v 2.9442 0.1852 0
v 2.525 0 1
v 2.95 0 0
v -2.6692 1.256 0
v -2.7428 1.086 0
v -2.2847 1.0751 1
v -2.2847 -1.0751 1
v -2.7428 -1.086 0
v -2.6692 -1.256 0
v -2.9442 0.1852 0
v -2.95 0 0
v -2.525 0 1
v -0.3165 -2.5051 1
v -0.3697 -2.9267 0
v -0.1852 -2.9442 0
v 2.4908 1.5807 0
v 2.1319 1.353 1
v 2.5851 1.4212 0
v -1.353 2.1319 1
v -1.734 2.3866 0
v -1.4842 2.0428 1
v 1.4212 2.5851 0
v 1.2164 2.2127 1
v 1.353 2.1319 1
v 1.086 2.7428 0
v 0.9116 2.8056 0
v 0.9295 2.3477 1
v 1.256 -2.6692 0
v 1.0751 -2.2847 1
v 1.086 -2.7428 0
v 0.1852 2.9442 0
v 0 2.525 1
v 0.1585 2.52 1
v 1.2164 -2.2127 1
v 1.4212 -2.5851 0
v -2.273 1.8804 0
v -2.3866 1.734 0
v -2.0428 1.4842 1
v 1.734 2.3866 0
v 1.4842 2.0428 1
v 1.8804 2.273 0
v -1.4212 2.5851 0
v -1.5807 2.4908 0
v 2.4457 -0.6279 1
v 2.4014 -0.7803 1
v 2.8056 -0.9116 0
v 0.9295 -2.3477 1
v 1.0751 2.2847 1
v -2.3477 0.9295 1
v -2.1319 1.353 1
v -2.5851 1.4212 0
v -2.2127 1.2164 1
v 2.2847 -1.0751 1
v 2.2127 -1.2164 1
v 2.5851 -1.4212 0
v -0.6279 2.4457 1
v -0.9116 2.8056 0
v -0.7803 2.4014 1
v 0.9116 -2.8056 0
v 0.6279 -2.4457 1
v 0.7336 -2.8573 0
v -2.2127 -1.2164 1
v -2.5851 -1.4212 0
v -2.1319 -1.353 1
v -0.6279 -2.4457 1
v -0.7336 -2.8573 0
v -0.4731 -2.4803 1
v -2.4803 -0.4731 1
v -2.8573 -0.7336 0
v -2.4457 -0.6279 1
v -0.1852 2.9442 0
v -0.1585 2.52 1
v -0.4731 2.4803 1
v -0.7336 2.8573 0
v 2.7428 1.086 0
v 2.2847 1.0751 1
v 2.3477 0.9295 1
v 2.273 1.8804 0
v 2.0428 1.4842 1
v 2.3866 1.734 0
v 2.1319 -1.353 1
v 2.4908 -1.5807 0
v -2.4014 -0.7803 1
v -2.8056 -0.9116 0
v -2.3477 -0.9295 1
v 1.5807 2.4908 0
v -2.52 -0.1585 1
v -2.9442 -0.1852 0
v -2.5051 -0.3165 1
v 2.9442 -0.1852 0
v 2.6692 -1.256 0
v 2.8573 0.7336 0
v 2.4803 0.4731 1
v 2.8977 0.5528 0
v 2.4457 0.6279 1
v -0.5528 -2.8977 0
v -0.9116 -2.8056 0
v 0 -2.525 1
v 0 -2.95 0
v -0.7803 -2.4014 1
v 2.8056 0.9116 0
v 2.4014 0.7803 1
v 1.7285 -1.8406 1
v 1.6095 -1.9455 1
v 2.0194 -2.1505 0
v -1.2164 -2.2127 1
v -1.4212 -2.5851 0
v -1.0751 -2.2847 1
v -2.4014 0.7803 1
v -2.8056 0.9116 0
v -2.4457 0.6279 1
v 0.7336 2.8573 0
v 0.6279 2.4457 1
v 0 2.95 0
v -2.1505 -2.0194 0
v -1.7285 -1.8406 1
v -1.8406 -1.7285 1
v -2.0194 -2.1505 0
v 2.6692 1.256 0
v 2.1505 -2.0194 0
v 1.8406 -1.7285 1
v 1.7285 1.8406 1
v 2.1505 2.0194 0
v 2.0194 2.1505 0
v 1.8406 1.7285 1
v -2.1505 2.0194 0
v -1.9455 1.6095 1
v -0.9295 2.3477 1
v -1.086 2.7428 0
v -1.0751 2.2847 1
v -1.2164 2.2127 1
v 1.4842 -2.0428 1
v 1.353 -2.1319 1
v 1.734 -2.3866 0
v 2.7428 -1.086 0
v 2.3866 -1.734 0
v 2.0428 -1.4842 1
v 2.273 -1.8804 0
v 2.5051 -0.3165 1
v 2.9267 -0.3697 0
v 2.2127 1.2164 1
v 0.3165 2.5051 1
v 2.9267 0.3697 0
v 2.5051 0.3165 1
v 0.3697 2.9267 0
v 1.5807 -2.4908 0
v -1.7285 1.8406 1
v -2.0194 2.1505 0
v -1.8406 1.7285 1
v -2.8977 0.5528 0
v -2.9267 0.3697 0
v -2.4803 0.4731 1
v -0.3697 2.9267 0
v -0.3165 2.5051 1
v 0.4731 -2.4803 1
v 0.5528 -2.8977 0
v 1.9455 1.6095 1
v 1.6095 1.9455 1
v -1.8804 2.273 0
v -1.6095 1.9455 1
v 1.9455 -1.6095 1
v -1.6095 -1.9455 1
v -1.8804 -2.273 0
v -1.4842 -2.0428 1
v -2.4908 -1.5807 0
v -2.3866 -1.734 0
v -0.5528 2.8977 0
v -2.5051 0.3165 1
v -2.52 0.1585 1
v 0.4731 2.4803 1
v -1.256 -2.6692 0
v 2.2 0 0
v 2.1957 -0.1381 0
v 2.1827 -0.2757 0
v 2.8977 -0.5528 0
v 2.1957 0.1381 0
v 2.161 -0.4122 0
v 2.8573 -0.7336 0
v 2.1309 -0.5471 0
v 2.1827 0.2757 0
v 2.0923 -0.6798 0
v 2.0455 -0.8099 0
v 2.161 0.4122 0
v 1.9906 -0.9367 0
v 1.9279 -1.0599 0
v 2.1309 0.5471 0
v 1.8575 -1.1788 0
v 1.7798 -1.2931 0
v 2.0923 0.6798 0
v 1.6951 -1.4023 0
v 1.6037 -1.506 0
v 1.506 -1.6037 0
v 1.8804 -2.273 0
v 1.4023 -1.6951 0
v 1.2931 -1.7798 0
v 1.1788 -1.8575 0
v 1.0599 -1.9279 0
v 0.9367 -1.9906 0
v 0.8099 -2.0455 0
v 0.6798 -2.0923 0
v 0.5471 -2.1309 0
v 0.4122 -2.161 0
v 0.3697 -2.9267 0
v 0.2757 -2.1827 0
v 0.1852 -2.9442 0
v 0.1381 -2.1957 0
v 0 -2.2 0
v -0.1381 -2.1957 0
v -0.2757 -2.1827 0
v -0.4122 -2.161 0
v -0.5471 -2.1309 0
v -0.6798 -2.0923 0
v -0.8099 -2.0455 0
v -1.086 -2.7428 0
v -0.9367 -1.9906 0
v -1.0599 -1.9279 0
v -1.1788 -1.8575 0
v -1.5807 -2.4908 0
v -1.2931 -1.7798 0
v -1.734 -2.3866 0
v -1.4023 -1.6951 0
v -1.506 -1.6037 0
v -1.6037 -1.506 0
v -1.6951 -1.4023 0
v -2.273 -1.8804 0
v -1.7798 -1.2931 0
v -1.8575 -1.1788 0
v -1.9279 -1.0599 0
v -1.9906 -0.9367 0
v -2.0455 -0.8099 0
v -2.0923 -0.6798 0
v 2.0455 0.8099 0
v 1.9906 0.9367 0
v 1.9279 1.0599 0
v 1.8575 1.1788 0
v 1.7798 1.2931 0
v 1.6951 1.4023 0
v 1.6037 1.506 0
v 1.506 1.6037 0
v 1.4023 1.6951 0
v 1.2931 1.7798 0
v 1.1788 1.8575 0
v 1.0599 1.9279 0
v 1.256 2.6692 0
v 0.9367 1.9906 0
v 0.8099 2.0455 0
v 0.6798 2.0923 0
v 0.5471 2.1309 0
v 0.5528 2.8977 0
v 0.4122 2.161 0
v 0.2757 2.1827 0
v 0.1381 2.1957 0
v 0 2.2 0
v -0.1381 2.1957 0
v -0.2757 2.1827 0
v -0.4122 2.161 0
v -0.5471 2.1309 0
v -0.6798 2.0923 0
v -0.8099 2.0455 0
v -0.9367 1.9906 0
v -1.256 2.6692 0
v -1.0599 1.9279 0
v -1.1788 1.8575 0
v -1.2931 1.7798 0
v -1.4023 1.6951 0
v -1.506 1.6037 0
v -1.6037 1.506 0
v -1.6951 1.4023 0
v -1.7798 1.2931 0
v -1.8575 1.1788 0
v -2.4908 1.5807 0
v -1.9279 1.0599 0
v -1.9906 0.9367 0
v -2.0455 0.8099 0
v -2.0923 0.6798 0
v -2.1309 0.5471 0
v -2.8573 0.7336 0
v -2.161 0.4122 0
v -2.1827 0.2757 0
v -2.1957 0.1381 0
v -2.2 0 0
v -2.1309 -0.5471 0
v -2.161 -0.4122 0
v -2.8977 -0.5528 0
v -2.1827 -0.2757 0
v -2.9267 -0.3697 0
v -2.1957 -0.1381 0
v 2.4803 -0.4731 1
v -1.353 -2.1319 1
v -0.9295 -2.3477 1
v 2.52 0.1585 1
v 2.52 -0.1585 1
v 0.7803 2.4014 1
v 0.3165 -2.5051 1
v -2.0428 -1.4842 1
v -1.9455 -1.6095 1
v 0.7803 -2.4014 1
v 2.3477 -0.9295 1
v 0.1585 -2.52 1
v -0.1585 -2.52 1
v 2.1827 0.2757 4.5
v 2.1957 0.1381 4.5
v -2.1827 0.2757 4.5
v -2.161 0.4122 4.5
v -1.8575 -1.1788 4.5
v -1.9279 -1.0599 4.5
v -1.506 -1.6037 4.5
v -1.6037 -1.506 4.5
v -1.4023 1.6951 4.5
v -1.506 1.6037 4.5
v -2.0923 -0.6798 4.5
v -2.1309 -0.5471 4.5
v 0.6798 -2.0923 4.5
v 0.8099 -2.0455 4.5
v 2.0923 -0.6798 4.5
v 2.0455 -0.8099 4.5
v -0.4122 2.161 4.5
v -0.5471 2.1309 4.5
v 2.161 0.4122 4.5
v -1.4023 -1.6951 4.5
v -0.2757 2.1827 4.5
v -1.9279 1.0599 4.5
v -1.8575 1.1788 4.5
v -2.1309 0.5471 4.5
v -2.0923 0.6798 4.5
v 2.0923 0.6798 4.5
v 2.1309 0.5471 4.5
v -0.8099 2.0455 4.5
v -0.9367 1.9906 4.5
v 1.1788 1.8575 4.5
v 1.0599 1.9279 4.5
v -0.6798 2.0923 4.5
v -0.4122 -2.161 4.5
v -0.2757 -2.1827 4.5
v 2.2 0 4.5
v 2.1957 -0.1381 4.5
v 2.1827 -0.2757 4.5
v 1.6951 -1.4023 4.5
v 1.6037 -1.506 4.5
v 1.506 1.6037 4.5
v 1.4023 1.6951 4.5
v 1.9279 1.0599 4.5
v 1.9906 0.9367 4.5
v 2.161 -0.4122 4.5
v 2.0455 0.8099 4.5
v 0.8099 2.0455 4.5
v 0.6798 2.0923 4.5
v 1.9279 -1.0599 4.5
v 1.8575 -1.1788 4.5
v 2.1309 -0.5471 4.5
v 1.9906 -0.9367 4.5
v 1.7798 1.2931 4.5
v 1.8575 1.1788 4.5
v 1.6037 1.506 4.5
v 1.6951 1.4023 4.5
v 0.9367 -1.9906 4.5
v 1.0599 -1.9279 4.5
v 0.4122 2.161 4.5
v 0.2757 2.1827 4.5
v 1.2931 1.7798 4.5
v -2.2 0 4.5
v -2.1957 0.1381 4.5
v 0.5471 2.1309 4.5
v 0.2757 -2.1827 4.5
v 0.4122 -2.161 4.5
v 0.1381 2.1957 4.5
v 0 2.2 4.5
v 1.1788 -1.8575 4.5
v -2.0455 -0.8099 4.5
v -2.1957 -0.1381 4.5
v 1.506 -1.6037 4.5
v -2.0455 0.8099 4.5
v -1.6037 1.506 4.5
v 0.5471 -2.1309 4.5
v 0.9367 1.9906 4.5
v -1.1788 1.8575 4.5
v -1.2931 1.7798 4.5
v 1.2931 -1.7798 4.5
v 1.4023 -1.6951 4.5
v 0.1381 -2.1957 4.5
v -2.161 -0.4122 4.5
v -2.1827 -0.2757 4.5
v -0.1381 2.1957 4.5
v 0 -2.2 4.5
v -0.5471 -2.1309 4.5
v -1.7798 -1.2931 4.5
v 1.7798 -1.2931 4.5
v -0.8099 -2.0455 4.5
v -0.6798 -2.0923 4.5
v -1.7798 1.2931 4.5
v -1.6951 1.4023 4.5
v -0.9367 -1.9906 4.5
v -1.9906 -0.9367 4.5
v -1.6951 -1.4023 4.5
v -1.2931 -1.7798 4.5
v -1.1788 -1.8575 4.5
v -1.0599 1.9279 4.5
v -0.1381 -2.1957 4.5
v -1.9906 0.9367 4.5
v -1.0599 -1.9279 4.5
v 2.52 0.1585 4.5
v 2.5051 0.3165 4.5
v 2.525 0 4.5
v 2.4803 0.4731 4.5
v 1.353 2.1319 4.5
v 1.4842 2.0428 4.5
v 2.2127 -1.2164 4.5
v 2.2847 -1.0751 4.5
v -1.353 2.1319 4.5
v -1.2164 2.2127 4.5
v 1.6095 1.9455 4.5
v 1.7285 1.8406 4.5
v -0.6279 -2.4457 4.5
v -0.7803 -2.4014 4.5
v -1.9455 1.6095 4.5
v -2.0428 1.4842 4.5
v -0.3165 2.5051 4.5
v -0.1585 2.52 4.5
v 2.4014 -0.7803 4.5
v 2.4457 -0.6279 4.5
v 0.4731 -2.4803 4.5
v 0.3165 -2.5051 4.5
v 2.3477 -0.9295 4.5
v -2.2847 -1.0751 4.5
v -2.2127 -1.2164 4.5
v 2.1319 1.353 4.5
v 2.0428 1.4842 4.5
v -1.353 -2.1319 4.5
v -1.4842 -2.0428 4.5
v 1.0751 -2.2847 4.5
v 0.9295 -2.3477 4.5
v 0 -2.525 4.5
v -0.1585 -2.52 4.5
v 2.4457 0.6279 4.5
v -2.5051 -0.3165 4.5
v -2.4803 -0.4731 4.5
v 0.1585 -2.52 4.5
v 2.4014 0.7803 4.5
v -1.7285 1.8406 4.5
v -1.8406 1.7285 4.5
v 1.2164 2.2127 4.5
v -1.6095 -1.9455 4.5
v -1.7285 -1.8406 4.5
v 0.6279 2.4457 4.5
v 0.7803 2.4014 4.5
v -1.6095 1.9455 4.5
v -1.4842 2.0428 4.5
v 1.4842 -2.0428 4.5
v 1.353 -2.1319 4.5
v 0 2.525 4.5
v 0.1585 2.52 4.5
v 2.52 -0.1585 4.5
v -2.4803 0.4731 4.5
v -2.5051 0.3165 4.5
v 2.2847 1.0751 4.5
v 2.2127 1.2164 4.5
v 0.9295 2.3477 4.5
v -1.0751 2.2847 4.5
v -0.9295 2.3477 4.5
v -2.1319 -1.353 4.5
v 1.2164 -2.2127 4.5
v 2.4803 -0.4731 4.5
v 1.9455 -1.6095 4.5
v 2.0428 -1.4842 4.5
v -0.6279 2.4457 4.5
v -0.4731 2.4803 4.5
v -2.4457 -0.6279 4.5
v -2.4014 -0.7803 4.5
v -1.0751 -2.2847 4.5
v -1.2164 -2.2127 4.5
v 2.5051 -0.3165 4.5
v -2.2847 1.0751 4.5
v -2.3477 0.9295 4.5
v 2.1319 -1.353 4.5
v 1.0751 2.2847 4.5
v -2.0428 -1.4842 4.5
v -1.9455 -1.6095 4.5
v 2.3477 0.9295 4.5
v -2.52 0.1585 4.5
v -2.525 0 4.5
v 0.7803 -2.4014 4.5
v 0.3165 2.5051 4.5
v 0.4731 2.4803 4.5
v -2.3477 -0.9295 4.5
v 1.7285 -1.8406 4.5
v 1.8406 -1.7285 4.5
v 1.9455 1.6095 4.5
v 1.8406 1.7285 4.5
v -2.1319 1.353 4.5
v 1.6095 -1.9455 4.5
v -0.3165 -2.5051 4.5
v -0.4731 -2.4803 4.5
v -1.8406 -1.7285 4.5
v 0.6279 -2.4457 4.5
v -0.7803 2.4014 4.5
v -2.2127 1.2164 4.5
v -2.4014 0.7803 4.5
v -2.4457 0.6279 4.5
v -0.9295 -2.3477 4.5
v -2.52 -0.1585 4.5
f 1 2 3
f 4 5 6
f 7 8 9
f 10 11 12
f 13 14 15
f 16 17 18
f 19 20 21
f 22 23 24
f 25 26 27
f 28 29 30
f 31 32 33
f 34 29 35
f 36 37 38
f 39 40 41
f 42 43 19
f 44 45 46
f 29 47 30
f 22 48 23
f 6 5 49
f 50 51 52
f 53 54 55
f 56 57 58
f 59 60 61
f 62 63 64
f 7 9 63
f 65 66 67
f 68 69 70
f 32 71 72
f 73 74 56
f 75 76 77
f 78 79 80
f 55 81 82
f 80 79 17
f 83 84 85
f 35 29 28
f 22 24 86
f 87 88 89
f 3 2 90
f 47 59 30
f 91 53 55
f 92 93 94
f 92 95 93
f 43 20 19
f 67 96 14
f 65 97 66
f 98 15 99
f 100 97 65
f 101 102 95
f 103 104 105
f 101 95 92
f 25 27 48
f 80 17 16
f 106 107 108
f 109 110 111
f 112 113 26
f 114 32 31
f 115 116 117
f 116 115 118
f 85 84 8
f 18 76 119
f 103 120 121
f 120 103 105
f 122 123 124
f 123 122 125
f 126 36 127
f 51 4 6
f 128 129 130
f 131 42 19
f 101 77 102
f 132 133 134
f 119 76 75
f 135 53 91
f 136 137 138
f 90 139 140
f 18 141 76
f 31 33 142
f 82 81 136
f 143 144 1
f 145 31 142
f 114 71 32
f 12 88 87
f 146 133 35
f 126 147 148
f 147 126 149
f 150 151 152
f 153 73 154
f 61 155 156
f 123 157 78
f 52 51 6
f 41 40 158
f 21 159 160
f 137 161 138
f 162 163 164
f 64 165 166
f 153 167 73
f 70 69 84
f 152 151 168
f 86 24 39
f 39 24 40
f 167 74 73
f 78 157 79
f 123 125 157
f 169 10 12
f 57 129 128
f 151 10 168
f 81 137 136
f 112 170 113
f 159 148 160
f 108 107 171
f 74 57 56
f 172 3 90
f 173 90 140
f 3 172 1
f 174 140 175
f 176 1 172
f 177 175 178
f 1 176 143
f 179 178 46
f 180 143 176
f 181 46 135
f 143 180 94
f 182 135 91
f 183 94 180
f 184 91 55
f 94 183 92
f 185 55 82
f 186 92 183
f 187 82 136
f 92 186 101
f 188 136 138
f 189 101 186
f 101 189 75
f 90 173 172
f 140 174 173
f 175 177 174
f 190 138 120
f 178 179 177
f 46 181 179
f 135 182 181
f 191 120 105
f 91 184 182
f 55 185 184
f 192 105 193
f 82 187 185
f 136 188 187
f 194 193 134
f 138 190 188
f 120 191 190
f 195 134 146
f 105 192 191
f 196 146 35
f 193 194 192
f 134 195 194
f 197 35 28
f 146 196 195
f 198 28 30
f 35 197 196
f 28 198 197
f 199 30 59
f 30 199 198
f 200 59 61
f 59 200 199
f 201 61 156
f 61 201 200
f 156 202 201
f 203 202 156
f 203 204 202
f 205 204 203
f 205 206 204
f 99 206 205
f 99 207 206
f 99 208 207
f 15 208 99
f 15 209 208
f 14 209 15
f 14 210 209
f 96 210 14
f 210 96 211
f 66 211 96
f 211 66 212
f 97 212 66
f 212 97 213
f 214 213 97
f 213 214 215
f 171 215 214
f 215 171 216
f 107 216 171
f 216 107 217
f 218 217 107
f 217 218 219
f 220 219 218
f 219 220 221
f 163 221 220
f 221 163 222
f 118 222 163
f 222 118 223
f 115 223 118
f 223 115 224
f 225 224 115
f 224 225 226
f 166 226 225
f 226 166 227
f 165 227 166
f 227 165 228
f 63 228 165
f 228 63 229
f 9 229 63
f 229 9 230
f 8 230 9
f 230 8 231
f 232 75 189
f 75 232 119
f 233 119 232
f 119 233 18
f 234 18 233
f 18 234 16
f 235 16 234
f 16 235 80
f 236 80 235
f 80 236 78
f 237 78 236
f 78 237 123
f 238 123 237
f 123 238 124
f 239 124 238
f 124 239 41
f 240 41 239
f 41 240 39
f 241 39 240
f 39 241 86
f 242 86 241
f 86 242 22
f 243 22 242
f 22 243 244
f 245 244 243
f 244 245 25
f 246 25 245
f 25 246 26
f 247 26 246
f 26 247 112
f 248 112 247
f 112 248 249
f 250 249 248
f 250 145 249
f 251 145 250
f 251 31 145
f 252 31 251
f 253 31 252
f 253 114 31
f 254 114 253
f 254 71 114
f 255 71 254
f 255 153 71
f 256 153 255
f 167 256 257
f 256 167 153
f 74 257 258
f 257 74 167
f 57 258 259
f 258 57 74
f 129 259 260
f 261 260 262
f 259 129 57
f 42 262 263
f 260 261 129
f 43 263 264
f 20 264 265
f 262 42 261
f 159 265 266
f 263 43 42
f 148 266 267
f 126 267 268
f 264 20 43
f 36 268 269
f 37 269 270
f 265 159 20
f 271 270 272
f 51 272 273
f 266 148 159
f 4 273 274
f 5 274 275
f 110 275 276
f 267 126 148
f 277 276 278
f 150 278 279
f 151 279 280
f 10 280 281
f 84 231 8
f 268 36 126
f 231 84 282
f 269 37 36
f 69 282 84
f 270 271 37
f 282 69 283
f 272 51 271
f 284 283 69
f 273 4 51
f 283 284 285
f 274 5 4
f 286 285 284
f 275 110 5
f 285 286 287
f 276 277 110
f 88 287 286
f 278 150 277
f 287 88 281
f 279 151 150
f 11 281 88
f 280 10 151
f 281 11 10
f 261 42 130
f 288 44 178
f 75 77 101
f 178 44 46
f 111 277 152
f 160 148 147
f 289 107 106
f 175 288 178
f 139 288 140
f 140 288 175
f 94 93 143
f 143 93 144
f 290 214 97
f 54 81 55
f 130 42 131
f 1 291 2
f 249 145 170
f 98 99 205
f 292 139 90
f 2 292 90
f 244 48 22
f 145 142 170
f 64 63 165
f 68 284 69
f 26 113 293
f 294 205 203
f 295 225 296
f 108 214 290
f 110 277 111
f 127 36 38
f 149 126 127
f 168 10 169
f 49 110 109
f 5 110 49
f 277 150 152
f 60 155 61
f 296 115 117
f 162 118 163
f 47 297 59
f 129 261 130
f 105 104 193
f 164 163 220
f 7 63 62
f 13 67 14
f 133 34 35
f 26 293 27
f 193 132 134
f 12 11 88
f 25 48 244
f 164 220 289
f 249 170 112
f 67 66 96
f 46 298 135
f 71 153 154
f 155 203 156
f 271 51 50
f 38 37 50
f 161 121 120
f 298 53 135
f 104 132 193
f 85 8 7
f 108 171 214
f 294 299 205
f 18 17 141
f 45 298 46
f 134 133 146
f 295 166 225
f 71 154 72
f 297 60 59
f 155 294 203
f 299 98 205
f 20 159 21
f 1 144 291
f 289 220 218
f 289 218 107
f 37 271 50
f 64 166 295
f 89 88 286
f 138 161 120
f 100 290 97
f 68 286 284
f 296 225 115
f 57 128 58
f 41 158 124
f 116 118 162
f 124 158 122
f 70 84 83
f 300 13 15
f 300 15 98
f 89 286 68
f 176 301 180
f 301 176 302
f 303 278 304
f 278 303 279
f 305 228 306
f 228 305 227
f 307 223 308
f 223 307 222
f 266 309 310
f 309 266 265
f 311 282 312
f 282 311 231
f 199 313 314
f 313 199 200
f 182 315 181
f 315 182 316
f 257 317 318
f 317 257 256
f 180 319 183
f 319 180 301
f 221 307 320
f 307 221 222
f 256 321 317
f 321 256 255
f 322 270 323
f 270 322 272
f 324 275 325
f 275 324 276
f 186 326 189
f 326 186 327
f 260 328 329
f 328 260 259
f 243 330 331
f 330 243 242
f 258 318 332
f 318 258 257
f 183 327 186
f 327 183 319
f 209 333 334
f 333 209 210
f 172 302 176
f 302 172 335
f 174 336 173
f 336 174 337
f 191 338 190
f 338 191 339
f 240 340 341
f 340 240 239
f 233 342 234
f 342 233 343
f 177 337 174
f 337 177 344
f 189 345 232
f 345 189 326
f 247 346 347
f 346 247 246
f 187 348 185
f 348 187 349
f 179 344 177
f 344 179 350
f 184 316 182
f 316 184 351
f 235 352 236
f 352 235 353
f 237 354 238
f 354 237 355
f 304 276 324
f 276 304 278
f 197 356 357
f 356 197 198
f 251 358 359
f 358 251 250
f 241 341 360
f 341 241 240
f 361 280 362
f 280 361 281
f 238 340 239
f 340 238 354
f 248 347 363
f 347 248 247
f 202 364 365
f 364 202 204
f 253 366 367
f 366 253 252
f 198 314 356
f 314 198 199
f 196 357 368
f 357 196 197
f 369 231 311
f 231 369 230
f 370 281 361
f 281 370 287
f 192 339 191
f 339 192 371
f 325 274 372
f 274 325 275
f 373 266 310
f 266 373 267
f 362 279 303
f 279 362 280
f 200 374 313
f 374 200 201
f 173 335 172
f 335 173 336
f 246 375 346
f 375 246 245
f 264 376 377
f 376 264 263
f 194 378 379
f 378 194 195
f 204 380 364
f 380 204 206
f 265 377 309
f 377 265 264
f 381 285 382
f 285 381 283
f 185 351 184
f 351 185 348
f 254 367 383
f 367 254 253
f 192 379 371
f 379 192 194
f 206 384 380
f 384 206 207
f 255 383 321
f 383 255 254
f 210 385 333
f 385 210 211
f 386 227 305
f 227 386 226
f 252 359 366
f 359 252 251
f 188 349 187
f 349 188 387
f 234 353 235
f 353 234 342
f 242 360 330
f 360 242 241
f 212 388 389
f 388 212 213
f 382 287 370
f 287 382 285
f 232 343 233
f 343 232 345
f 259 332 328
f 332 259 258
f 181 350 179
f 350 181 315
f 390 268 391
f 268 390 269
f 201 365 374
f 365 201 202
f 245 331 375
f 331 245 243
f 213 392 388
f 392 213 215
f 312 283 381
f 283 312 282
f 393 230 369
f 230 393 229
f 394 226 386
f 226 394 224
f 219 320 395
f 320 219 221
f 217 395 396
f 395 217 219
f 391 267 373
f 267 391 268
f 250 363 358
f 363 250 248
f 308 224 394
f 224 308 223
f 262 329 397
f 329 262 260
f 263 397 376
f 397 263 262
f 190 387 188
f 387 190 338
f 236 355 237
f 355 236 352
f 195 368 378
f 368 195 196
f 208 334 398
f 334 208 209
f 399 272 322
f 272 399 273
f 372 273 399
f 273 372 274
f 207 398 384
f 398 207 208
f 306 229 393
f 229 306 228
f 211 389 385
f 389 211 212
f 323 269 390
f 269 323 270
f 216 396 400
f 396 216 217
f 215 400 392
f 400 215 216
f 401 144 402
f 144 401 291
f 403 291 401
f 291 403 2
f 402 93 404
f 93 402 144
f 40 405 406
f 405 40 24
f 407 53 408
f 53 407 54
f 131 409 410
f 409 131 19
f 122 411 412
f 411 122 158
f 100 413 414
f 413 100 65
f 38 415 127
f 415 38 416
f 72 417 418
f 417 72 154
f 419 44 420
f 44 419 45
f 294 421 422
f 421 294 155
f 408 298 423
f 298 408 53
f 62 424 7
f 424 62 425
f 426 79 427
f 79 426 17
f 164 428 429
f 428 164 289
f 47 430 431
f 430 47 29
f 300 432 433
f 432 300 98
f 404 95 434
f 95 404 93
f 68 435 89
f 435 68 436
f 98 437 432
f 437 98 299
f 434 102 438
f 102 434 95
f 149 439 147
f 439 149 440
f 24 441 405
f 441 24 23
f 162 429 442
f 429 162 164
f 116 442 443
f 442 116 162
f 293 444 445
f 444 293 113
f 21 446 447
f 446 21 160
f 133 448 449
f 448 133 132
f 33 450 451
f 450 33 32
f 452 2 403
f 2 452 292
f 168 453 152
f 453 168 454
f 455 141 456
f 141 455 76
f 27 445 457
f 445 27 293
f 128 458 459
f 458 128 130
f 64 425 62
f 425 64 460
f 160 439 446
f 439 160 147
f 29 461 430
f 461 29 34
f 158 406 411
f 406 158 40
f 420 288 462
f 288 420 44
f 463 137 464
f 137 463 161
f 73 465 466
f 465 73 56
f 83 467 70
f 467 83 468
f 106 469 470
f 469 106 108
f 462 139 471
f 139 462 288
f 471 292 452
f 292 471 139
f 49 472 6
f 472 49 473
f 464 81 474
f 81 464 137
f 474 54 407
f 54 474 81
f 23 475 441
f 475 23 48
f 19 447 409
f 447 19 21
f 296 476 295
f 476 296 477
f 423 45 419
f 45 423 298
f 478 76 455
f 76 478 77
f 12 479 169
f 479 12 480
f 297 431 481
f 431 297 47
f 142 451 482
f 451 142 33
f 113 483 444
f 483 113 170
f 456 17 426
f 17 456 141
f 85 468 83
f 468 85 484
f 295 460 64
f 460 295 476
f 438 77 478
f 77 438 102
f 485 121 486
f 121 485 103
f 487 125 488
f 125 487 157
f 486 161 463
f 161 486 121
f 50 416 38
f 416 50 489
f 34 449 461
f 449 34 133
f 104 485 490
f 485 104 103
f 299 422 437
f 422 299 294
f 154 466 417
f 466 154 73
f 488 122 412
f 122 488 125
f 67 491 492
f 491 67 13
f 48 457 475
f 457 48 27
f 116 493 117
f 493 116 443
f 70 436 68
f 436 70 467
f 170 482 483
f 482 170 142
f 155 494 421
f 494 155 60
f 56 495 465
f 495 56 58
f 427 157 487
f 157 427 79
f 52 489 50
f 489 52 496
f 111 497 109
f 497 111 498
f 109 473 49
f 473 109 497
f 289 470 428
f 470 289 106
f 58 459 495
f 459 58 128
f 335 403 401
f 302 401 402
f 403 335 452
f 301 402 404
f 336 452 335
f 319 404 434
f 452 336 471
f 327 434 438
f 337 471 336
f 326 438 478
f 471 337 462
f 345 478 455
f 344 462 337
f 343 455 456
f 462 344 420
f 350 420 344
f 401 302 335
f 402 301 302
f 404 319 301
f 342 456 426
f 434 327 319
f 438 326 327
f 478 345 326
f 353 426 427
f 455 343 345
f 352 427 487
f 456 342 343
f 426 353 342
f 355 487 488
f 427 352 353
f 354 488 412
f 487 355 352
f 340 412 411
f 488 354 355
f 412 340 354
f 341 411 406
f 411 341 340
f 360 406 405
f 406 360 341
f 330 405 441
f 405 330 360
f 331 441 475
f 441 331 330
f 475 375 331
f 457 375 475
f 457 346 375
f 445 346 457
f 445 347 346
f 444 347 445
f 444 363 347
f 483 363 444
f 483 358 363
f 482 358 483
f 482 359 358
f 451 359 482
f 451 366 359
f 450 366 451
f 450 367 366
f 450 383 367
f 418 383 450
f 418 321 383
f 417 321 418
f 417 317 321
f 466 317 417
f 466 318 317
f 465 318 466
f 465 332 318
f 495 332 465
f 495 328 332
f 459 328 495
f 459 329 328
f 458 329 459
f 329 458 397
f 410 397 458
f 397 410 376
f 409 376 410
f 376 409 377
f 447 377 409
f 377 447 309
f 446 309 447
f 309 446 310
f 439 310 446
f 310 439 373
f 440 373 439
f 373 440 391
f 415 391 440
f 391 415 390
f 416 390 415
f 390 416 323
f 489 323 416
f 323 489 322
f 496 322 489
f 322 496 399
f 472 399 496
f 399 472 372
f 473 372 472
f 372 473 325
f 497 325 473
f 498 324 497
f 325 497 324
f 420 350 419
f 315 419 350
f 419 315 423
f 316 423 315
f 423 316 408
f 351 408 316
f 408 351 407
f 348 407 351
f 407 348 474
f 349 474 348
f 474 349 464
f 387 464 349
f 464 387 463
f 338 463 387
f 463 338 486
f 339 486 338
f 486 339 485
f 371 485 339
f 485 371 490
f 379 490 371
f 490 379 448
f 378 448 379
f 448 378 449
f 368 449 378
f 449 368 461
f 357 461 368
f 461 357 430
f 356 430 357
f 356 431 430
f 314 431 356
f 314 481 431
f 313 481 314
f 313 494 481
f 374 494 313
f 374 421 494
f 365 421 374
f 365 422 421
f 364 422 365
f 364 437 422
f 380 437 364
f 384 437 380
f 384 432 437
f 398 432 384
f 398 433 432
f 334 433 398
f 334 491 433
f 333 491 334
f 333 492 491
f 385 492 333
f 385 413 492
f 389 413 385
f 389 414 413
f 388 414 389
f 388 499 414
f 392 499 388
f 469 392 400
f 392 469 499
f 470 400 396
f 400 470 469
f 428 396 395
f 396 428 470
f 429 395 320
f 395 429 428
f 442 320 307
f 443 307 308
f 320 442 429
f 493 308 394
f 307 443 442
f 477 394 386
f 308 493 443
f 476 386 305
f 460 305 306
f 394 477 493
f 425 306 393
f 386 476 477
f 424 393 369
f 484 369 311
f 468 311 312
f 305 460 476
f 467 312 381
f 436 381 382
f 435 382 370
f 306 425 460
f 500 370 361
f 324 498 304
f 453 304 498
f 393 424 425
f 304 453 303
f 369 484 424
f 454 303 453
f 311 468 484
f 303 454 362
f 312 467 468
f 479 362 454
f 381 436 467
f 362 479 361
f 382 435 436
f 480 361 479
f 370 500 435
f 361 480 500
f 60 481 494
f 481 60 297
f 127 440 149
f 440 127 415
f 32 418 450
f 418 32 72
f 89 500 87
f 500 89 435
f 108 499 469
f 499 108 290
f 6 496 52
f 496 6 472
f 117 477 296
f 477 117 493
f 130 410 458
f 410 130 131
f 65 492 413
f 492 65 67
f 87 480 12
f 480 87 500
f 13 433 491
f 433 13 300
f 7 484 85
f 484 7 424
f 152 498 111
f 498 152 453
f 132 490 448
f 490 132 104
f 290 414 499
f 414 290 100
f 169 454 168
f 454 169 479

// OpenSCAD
difference() {
    cylinder(r1 = 2.95, r2 = 2.525, h = 1, $fn = 100);

cylinder(d = 4.4, h = 4, $fn = 100);
}
difference() {
translate([0,0,1]) {
        cylinder(d = 5.05, h = 3.5, $fn = 100);
    }
    cylinder(d = 4.4, h = 4.5, $fn = 100);
}
